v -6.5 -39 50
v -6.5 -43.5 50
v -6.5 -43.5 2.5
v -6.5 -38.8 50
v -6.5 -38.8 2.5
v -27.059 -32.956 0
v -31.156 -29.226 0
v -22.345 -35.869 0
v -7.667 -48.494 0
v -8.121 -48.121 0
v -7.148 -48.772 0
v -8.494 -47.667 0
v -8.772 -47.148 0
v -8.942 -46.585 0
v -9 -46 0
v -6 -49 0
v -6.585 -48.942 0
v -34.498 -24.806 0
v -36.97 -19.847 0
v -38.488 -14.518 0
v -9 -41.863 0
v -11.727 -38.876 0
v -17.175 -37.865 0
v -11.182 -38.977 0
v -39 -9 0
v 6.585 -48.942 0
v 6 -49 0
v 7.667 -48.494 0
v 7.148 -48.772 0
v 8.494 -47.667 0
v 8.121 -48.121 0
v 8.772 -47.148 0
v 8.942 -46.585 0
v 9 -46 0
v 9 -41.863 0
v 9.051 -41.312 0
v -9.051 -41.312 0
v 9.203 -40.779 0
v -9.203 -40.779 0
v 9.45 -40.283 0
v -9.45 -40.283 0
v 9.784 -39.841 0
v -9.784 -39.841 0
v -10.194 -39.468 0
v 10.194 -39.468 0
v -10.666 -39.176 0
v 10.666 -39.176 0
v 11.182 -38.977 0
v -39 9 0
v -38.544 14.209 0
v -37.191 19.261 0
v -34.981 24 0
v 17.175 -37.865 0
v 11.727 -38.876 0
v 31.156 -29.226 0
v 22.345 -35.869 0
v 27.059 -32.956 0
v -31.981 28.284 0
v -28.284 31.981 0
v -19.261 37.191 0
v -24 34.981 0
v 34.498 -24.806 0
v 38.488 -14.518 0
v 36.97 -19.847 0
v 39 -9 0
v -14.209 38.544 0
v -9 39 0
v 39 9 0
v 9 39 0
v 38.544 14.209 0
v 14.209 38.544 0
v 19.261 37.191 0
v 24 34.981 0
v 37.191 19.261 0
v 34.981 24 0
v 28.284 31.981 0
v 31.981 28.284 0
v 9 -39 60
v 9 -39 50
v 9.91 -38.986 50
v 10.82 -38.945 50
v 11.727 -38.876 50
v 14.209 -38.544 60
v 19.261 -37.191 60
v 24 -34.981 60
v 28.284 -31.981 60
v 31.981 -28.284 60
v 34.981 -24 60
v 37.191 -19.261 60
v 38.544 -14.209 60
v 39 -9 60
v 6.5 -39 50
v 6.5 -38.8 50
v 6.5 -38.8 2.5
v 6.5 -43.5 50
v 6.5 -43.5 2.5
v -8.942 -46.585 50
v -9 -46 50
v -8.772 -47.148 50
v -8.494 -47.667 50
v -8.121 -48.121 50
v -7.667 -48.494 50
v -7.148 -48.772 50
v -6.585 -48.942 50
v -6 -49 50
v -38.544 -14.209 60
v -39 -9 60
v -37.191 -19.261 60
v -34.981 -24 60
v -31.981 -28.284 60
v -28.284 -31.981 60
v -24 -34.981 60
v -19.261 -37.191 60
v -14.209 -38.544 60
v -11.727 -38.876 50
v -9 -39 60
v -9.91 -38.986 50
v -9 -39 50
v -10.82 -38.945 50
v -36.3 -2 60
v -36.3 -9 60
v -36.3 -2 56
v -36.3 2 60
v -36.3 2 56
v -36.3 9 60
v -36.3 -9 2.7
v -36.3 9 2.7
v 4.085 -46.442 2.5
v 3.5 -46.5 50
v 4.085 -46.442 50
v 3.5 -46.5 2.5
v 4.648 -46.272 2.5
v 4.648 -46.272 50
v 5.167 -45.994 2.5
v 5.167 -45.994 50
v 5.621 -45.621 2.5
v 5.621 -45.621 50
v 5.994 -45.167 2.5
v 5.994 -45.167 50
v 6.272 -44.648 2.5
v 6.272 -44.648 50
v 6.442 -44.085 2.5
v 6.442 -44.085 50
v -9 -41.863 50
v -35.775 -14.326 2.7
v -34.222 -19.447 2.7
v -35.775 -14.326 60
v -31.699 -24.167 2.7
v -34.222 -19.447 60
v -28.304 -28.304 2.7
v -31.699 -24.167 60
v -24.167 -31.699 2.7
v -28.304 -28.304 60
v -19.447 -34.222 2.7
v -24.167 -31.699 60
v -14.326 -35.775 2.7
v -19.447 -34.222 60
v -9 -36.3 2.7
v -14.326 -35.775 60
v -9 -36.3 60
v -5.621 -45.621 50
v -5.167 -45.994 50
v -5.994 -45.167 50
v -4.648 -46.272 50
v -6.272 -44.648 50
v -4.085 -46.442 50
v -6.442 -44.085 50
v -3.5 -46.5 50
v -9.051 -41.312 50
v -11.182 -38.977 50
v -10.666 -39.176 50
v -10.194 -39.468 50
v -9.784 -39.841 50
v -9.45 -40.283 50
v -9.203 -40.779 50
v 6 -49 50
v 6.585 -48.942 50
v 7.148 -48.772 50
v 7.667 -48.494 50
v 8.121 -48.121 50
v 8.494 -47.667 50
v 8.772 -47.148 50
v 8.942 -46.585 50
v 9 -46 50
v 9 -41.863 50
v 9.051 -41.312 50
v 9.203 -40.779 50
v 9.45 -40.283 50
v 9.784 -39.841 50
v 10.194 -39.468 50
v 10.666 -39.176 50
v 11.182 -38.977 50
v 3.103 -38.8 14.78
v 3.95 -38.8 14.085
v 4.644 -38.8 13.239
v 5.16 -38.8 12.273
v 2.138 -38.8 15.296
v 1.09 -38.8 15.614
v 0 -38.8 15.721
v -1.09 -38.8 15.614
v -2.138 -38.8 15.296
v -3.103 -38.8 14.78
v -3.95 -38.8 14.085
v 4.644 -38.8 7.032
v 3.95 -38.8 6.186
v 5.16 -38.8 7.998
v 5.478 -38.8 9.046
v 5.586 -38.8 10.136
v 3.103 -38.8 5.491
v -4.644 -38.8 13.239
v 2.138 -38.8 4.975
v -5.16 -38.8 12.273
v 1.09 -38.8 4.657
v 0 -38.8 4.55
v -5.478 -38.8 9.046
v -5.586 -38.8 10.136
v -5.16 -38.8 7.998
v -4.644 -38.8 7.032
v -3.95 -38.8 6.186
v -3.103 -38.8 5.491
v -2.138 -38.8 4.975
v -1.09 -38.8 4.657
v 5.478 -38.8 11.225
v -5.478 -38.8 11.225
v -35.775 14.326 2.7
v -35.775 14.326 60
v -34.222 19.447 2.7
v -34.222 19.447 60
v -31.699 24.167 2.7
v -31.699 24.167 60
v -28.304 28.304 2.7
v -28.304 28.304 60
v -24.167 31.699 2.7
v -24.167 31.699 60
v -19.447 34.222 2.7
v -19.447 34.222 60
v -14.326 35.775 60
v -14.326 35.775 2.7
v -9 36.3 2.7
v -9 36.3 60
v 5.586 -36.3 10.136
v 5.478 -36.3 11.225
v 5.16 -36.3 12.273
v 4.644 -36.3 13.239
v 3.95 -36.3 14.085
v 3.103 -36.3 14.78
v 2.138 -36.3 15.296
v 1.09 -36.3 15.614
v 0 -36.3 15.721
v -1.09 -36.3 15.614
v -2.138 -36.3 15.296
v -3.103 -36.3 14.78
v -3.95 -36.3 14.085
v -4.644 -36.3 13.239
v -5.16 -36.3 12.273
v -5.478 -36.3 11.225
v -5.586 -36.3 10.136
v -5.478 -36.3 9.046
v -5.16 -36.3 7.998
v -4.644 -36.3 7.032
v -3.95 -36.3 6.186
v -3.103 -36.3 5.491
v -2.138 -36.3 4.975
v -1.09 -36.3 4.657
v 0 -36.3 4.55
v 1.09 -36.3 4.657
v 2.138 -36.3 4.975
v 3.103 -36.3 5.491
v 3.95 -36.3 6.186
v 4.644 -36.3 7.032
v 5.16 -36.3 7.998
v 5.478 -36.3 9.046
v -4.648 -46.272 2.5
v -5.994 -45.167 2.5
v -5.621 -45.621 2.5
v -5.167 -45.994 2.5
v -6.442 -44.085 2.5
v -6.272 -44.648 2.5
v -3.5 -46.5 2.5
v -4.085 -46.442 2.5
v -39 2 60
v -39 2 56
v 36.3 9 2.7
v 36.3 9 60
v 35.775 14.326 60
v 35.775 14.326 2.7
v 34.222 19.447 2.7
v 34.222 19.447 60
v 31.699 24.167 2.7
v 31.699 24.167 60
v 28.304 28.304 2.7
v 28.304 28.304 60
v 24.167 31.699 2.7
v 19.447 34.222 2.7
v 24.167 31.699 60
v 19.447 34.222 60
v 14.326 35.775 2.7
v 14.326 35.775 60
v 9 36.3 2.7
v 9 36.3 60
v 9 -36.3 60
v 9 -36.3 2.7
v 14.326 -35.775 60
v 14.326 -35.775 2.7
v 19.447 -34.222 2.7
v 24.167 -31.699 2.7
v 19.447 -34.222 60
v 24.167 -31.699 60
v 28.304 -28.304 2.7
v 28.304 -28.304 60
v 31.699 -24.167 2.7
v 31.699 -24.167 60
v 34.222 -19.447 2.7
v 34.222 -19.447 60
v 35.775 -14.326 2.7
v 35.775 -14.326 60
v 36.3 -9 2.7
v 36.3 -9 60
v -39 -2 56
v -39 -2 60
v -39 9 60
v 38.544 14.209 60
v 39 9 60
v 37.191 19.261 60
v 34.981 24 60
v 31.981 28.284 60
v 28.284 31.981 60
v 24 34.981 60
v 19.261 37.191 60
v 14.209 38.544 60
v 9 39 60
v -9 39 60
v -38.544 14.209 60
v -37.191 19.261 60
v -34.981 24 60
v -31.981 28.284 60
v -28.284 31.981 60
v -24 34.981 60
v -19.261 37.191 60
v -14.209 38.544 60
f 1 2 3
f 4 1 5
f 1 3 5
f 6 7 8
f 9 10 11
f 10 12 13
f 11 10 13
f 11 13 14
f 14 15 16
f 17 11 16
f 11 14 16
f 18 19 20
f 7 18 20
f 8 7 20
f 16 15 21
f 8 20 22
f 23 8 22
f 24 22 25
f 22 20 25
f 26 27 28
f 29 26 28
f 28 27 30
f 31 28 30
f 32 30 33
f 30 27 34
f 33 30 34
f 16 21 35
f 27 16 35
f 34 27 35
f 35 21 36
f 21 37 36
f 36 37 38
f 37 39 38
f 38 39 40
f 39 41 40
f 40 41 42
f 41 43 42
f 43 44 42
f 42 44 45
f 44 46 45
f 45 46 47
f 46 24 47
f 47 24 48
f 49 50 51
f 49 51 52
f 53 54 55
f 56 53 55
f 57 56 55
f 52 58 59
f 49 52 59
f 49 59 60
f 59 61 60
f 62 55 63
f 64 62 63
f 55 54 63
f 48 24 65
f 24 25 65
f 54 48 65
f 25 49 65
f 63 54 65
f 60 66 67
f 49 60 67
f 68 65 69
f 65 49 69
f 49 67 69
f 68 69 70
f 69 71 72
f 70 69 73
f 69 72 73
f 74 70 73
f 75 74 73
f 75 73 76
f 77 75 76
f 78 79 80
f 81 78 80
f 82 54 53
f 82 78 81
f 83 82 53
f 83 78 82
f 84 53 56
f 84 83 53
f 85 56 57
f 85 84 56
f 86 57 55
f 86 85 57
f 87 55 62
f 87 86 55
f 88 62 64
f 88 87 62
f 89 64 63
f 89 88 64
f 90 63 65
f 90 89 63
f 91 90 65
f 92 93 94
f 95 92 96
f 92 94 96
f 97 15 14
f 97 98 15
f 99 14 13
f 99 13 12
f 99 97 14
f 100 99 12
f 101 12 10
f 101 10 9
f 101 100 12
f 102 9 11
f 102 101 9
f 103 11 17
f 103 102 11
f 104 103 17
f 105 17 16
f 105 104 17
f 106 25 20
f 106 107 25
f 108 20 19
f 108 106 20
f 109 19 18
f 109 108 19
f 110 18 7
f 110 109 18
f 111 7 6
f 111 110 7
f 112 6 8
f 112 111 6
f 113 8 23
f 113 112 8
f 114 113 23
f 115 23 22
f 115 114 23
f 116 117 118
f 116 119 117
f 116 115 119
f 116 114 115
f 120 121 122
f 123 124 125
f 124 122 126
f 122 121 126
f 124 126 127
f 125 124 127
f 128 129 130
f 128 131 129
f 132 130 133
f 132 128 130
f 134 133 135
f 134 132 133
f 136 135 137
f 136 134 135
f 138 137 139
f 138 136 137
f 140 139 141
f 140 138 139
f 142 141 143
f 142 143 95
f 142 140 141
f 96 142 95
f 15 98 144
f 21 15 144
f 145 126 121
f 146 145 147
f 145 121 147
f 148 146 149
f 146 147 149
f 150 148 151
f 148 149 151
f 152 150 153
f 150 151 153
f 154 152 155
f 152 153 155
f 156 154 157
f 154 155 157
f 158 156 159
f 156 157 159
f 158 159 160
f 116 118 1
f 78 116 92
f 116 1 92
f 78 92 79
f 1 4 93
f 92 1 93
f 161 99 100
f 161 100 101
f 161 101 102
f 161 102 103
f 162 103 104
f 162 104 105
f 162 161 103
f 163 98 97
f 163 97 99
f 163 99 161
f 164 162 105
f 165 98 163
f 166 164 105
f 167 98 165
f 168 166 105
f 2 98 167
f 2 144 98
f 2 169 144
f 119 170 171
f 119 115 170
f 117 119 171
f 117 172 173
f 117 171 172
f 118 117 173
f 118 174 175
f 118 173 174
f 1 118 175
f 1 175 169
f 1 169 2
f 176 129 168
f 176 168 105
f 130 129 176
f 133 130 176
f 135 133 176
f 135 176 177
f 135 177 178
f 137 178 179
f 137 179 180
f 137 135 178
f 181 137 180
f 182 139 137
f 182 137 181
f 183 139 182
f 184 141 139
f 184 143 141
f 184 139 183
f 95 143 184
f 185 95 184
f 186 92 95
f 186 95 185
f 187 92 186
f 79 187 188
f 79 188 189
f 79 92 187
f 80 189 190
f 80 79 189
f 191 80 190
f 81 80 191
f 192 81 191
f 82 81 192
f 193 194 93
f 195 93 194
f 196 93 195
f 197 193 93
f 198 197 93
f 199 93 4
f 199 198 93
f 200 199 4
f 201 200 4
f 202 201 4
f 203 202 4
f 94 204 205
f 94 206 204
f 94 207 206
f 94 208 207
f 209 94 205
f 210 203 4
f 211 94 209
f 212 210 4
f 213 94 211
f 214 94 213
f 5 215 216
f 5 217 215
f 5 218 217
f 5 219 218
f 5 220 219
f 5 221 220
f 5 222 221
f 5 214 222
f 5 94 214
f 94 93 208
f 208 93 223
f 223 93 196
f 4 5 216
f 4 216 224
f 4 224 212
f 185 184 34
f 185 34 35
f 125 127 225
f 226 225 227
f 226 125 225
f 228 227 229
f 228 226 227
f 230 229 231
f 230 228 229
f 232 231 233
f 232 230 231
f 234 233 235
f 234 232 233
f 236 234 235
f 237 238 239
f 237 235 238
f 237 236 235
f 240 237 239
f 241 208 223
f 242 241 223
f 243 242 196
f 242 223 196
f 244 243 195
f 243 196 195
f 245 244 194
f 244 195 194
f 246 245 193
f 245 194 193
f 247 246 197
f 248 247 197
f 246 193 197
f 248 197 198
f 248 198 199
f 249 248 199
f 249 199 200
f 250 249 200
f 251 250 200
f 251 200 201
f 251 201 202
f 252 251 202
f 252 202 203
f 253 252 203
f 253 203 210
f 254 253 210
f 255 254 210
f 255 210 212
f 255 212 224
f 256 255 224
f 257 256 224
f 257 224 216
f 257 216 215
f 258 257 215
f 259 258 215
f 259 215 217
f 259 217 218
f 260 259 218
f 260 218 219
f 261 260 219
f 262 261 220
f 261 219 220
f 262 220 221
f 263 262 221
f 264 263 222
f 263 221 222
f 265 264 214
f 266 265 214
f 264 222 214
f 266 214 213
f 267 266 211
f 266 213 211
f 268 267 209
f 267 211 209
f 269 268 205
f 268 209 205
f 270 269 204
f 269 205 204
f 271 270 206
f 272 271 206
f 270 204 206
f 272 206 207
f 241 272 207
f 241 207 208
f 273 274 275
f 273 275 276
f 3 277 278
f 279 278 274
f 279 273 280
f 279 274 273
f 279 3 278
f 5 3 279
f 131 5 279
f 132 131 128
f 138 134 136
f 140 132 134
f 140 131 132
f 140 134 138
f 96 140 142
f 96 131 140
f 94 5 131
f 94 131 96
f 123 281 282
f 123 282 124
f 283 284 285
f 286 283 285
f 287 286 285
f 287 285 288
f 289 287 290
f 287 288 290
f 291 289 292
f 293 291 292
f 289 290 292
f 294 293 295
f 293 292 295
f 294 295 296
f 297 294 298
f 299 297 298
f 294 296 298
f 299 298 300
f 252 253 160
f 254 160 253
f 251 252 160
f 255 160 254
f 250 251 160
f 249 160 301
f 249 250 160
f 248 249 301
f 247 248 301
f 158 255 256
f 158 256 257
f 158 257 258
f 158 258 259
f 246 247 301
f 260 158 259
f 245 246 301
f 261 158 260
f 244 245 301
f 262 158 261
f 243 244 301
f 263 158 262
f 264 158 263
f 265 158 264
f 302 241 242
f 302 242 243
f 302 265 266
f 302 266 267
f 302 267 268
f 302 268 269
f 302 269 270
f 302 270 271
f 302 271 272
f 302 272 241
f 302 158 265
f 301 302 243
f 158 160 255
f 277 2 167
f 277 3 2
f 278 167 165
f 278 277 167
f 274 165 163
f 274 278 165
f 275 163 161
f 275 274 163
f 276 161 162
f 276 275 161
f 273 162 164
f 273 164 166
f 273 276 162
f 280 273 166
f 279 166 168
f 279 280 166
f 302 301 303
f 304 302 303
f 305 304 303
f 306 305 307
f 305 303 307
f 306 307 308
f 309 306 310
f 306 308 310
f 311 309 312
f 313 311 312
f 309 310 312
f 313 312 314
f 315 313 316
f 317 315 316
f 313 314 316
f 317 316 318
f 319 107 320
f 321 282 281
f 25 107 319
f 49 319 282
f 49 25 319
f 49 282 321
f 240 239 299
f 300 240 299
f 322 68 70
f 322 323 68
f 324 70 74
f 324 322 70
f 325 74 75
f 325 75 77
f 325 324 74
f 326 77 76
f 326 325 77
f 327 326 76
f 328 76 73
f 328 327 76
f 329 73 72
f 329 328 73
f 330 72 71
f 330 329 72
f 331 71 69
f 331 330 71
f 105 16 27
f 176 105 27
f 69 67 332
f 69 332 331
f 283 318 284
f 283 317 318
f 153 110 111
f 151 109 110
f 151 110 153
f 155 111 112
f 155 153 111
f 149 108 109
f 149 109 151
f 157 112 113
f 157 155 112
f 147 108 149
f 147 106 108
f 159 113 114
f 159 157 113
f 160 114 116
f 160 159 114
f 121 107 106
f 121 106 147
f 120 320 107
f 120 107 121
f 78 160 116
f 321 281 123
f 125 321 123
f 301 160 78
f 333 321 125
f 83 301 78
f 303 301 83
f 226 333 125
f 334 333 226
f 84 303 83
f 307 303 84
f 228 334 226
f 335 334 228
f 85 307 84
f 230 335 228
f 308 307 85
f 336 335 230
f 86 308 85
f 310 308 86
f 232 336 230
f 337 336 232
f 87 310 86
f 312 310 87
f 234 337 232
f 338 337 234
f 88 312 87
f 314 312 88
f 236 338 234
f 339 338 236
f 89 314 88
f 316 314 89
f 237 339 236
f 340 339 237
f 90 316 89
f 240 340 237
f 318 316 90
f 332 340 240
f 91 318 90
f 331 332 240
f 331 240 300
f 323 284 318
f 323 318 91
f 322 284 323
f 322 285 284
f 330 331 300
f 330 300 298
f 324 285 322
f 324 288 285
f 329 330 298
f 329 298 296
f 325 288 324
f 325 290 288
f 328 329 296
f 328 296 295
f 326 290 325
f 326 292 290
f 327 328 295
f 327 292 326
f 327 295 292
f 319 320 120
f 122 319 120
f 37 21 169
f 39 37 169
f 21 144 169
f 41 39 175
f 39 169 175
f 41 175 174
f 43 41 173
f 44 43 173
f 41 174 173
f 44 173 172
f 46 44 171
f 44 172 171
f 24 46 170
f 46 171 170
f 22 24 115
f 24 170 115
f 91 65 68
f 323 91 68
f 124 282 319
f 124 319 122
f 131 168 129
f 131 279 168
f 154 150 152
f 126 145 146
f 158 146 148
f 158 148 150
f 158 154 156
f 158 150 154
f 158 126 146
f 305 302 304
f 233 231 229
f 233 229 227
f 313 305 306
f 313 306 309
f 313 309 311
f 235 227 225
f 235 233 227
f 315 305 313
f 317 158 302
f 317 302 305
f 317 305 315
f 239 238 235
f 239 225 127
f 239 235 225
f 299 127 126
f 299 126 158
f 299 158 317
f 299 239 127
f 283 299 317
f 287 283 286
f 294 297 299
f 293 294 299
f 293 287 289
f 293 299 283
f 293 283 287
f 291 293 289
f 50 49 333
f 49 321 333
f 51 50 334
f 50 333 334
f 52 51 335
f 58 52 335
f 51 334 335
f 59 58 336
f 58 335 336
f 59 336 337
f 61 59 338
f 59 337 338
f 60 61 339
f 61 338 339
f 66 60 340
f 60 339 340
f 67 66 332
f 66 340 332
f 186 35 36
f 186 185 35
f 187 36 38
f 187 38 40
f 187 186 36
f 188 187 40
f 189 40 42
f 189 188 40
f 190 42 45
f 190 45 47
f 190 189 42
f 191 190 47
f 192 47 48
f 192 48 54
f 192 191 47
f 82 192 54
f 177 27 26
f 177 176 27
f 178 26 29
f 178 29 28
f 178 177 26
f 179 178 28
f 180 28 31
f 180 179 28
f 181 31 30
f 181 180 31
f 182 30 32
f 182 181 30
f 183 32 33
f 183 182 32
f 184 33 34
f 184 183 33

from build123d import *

# Parameters (mm, degrees)
F0_W      = 78
F0_H      = 78
F1_DEPTH  = 60
F2_R      = 30
F4_T      = -2.7
F3_W      = 18
F3_H      = 10
F5_DEPTH  = 25
F6_DEPTH  = 50
F7_T      = -2.5
F8_R      = 5.5856812821
F9_DEPTH  = 25
F10_R     = 3
F11_W     = 2.7
F11_H     = 4
F12_DEPTH = 4


# Not quite as in the source:
# - a shell that OpenCascade refuses in one call is made with other operations: the cavity is built on its own and cut out


with BuildPart() as f1:
    # F0 (on Top) → F1 (new body)
    with BuildSketch(Plane.XY):
        Rectangle(F0_W, F0_H)
    extrude(amount=F1_DEPTH)

    # F2
    f2_edges = [f1.edges().sort_by_distance(p)[0] for p in [
        (-39, -39, 30),
        (39, -39, 30),
        (39, 39, 30),
        (-39, 39, 30),
    ]]
    fillet(f2_edges, radius=F2_R)

    # F4
    f4_openings = [f1.faces().sort_by_distance(p)[0] for p in [
        (0, 0, 60),
    ]]
    offset(amount=F4_T, openings=f4_openings)

    # F3 (on Top) → F5 (cut)
    with BuildSketch(Plane.XY):
        with Locations((0, -44)):
            Rectangle(F3_W, F3_H)
    extrude(amount=-F5_DEPTH, mode=Mode.SUBTRACT)

    # F3 (on Top) → F6 (join)
    with BuildSketch(Plane.XY):
        with Locations((0, -44)):
            Rectangle(F3_W, F3_H)
    extrude(amount=F6_DEPTH)

    # F7: a shell. OpenCascade refuses it in one call, so the cavity is built on its own and cut out:
    # the body offset inwards by the wall thickness, plus a prism from it out through each open face.
    f7_core = offset(f1.part, amount=F7_T, kind=Kind.INTERSECTION, mode=Mode.PRIVATE)
    f7_exits = [f7_core.faces().sort_by_distance(p)[0] for p in [
        (0, -42.65, 47.5),
    ]]
    add(f7_core, mode=Mode.SUBTRACT)
    extrude(f7_exits, amount=-F7_T, mode=Mode.SUBTRACT)

    # F8 (on face) → F9 (cut)
    with BuildSketch(Plane.XZ.offset(39)):
        with Locations((0, 10.1356906816)):
            Circle(F8_R)
    extrude(amount=-F9_DEPTH, mode=Mode.SUBTRACT)

    # F10
    f10_edges = [f1.edges().sort_by_distance(p)[0] for p in [
        (-9, -49, 25),
        (9, -49, 25),
        (-6.5, -46.5, 26.25),
        (6.5, -46.5, 26.25),
        (-9, -39, 25),
        (-9, -39, 55),
        (9, -39, 25),
        (9, -39, 55),
    ]]
    fillet(f10_edges, radius=F10_R)

    # F11 (on face) → F12 (cut)
    with BuildSketch(Plane.XY.offset(60)):
        with Locations((-37.65, 0)):
            Rectangle(F11_W, F11_H)
    extrude(amount=-F12_DEPTH, mode=Mode.SUBTRACT)


solid = f1.part
